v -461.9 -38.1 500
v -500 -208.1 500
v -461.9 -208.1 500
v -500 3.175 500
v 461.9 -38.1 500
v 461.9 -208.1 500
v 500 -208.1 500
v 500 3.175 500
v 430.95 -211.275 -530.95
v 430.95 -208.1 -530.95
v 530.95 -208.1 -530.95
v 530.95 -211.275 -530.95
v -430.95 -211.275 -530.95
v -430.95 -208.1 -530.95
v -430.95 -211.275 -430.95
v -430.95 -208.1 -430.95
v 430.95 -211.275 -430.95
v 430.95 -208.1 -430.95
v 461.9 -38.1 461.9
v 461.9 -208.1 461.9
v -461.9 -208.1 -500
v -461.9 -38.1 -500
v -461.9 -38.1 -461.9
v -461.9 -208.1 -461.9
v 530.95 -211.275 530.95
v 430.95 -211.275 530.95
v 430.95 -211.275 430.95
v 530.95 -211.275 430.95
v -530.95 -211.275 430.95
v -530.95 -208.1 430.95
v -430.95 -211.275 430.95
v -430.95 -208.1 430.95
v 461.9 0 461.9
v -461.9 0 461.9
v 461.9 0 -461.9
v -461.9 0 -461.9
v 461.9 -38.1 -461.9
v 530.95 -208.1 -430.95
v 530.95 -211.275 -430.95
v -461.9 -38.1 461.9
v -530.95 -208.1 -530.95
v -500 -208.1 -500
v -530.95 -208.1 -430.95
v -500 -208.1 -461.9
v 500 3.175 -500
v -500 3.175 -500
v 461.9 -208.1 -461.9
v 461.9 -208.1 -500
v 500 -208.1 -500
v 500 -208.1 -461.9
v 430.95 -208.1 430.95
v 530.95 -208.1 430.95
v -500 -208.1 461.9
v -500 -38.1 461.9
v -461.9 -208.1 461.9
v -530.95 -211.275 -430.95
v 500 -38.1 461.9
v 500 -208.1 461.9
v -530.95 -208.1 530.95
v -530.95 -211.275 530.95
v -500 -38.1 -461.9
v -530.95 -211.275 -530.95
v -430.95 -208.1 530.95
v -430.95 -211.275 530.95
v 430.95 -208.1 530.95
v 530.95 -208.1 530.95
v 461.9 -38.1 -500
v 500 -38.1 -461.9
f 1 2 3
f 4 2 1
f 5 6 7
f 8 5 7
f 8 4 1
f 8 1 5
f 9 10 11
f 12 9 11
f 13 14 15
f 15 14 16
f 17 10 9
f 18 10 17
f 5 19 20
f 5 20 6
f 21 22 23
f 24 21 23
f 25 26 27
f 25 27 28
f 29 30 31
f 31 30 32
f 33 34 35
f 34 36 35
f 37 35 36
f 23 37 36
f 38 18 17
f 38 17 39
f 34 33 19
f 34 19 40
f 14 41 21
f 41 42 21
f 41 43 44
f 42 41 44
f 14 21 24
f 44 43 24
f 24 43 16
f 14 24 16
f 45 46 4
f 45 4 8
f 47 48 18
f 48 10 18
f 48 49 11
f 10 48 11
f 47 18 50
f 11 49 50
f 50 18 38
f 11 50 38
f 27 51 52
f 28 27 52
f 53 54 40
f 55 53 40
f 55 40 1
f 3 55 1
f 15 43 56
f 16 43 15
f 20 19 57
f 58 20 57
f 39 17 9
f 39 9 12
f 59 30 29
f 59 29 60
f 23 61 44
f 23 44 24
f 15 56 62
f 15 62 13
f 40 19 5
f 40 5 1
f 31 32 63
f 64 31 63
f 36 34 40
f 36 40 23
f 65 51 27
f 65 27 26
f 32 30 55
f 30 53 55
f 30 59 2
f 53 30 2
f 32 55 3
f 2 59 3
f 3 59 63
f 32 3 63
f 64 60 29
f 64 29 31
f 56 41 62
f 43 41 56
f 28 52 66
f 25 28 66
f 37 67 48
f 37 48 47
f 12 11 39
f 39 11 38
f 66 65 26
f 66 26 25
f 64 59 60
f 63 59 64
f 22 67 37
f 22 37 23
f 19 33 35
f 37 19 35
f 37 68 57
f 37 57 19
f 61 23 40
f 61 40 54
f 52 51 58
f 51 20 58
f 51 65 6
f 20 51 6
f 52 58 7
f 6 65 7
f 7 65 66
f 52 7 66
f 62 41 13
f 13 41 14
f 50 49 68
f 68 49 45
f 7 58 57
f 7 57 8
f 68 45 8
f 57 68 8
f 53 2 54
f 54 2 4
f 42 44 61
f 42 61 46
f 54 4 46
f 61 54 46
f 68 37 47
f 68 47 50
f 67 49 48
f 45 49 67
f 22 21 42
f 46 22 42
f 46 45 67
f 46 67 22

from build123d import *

# Parameters (mm, degrees)
CROQUIS1_W              = 1000
CROQUIS1_H              = 1000
SALIENTE_EXTRUIR1_DEPTH = 3.175
CROQUIS2_W              = 1000
CROQUIS2_H              = 1000
CROQUIS2_W_2            = 923.8
CROQUIS2_H_2            = 923.8
SALIENTE_EXTRUIR2_DEPTH = 38.1
CROQUIS3_W              = 38.1
CROQUIS3_H              = 38.1
SALIENTE_EXTRUIR3_DEPTH = 170
CROQUIS4_W              = 100
CROQUIS4_H              = 100
SALIENTE_EXTRUIR4_DEPTH = 3.175


with BuildPart() as part:
    # Croquis1 → Saliente-Extruir1 (new body)
    with BuildSketch(Plane(origin=(0, 0, 0), x_dir=(1, 0, 0), z_dir=(0, 1, 0))):
        Rectangle(CROQUIS1_W, CROQUIS1_H)
    extrude(amount=SALIENTE_EXTRUIR1_DEPTH)

    # Croquis2 → Saliente-Extruir2 (add)
    with BuildSketch(Plane(origin=(0, 0, 0), x_dir=(-1, 0, 0), z_dir=(0, -1, 0))):
        Rectangle(CROQUIS2_W, CROQUIS2_H)
        Rectangle(CROQUIS2_W_2, CROQUIS2_H_2, mode=Mode.SUBTRACT)
    extrude(amount=SALIENTE_EXTRUIR2_DEPTH)

    # Croquis3 → Saliente-Extruir3 (add)
    with BuildSketch(Plane.XZ.offset(38.1)):
        with Locations((480.95, 480.95)):
            Rectangle(CROQUIS3_W, CROQUIS3_H)
        with Locations((-480.95, 480.95)):
            Rectangle(CROQUIS3_W, CROQUIS3_H)
        with Locations((480.95, -480.95)):
            Rectangle(CROQUIS3_W, CROQUIS3_H)
        with Locations((-480.95, -480.95)):
            Rectangle(CROQUIS3_W, CROQUIS3_H)
    extrude(amount=SALIENTE_EXTRUIR3_DEPTH)

    # Croquis4 → Saliente-Extruir4 (add)
    with BuildSketch(Plane.XZ.offset(208.1)):
        with Locations((480.95, 480.95)):
            Rectangle(CROQUIS4_W, CROQUIS4_H)
        with Locations((-480.95, 480.95)):
            Rectangle(CROQUIS4_W, CROQUIS4_H)
        with Locations((480.95, -480.95)):
            Rectangle(CROQUIS4_W, CROQUIS4_H)
        with Locations((-480.95, -480.95)):
            Rectangle(CROQUIS4_W, CROQUIS4_H)
    extrude(amount=SALIENTE_EXTRUIR4_DEPTH)


solid = part.part
